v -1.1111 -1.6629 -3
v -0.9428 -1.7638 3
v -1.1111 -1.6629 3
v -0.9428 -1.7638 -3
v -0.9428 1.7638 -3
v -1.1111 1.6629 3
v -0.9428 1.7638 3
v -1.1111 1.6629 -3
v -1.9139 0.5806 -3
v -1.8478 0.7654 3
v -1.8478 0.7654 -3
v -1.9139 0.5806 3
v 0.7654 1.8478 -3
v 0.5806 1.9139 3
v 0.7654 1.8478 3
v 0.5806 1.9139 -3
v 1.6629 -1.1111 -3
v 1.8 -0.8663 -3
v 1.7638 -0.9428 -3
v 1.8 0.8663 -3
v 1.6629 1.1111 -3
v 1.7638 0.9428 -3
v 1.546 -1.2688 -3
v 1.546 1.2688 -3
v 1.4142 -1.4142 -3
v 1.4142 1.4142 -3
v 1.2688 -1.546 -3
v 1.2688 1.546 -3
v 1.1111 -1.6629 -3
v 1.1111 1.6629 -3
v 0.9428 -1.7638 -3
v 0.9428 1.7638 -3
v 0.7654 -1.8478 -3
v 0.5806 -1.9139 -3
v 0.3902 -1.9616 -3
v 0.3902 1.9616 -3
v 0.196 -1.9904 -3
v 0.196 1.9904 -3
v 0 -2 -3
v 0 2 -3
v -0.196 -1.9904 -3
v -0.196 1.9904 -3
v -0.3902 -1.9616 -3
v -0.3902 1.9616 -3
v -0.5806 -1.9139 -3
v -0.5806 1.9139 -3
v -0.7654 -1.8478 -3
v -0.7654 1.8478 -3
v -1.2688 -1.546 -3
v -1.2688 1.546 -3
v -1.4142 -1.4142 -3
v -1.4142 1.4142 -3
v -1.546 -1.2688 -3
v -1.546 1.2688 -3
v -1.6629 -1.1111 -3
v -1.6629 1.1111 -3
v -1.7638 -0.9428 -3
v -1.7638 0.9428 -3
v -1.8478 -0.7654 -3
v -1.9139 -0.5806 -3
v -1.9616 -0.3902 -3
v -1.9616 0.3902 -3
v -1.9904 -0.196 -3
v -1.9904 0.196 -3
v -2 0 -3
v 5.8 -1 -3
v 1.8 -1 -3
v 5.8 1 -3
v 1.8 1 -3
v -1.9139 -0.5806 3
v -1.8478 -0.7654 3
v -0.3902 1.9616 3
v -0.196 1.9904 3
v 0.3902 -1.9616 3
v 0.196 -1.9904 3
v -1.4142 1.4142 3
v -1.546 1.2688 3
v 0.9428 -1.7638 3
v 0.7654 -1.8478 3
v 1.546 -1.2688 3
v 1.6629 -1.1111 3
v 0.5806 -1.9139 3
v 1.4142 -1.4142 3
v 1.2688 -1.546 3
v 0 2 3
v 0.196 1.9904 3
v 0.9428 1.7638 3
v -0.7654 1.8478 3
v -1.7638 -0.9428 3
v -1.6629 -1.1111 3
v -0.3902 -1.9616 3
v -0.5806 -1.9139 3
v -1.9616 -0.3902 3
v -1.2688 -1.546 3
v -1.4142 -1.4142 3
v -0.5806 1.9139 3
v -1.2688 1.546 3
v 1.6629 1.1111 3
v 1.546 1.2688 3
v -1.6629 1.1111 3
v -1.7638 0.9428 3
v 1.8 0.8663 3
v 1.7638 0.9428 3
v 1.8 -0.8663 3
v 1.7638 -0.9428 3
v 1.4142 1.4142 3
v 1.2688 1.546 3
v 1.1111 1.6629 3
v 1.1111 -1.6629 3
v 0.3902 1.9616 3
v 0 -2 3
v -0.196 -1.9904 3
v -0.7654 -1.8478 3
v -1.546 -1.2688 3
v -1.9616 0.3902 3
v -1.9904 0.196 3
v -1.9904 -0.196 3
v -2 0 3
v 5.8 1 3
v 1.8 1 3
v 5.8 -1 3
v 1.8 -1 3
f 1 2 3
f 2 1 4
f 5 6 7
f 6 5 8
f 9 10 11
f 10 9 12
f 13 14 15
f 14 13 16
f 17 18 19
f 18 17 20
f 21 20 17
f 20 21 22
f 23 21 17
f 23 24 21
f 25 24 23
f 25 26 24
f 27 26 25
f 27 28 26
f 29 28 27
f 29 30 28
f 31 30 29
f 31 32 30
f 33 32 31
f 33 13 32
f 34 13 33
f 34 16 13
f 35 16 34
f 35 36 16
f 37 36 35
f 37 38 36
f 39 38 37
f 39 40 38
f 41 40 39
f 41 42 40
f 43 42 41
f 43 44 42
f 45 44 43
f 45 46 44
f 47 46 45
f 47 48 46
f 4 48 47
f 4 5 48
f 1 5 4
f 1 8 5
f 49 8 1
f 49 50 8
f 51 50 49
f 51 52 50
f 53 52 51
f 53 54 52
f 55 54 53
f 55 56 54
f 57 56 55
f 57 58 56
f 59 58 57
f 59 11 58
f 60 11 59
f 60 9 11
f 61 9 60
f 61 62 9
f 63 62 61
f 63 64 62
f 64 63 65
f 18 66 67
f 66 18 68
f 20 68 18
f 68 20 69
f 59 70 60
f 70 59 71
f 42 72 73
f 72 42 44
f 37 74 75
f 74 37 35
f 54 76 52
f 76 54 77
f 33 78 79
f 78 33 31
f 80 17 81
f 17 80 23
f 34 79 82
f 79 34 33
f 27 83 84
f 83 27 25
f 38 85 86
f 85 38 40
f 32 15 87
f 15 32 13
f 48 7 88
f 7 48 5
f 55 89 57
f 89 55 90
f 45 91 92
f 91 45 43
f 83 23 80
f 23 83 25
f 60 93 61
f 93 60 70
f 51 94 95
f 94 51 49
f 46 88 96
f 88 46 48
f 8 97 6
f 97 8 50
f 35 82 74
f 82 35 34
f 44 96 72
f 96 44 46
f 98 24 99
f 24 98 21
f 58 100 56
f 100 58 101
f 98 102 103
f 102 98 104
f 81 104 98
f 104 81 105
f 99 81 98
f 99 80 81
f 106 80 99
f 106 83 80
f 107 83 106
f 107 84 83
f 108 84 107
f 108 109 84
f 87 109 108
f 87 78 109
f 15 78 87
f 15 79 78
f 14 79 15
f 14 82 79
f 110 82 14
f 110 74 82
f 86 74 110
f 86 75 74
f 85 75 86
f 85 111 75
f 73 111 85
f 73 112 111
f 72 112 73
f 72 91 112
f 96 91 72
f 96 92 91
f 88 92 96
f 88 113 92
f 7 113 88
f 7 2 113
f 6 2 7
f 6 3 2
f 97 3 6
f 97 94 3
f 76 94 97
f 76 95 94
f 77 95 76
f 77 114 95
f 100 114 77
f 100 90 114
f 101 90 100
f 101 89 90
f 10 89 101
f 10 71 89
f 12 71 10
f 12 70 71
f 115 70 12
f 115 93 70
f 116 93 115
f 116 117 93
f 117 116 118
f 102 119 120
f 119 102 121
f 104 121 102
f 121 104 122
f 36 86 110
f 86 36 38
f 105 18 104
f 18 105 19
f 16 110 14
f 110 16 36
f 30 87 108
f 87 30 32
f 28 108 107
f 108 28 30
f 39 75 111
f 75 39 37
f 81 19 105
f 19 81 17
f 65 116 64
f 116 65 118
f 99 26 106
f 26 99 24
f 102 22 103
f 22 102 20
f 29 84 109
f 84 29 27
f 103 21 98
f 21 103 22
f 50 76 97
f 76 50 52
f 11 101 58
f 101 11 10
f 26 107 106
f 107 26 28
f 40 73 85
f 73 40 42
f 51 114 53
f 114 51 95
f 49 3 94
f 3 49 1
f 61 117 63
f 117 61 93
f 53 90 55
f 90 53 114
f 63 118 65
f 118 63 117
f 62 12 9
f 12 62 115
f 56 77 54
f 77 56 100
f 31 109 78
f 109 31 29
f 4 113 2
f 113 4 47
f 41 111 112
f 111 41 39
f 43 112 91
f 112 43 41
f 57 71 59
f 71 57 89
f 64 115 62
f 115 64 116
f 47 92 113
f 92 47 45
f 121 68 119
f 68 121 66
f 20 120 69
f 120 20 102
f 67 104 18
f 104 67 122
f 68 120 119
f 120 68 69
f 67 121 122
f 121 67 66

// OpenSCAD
// Parameters (A radial: [2.0, 0, 6])
radial_radius    = 2.0;  //[1:4:0.1]
radial_angle_deg = 0;    //[-180:180:1]
radial_height    = 6;    //[3:12:0.5]

// Quality
$fn = 64;

// Small overlap to guarantee a single connected solid
overlap = 0.2;

// A simple "radial" feature: a hub with one outward protruding arm,
// oriented by radial_angle_deg. All dimensions derived from parameters.
module radial_feature(r, ang, h) {
    hub_r   = r;
    hub_h   = h;

    arm_len = 2*r;          // protrudes outward by ~2 radii
    arm_w   = r;            // arm thickness
    arm_h   = h;

    union() {
        // Hub
        cylinder(r=hub_r, h=hub_h, center=true);

        // Radial arm (connected to hub with overlap)
        rotate([0, 0, ang])
            translate([hub_r + arm_len/2 - overlap, 0, 0])
                cube([arm_len, arm_w, arm_h], center=true);
    }
}

radial_feature(radial_radius, radial_angle_deg, radial_height);
